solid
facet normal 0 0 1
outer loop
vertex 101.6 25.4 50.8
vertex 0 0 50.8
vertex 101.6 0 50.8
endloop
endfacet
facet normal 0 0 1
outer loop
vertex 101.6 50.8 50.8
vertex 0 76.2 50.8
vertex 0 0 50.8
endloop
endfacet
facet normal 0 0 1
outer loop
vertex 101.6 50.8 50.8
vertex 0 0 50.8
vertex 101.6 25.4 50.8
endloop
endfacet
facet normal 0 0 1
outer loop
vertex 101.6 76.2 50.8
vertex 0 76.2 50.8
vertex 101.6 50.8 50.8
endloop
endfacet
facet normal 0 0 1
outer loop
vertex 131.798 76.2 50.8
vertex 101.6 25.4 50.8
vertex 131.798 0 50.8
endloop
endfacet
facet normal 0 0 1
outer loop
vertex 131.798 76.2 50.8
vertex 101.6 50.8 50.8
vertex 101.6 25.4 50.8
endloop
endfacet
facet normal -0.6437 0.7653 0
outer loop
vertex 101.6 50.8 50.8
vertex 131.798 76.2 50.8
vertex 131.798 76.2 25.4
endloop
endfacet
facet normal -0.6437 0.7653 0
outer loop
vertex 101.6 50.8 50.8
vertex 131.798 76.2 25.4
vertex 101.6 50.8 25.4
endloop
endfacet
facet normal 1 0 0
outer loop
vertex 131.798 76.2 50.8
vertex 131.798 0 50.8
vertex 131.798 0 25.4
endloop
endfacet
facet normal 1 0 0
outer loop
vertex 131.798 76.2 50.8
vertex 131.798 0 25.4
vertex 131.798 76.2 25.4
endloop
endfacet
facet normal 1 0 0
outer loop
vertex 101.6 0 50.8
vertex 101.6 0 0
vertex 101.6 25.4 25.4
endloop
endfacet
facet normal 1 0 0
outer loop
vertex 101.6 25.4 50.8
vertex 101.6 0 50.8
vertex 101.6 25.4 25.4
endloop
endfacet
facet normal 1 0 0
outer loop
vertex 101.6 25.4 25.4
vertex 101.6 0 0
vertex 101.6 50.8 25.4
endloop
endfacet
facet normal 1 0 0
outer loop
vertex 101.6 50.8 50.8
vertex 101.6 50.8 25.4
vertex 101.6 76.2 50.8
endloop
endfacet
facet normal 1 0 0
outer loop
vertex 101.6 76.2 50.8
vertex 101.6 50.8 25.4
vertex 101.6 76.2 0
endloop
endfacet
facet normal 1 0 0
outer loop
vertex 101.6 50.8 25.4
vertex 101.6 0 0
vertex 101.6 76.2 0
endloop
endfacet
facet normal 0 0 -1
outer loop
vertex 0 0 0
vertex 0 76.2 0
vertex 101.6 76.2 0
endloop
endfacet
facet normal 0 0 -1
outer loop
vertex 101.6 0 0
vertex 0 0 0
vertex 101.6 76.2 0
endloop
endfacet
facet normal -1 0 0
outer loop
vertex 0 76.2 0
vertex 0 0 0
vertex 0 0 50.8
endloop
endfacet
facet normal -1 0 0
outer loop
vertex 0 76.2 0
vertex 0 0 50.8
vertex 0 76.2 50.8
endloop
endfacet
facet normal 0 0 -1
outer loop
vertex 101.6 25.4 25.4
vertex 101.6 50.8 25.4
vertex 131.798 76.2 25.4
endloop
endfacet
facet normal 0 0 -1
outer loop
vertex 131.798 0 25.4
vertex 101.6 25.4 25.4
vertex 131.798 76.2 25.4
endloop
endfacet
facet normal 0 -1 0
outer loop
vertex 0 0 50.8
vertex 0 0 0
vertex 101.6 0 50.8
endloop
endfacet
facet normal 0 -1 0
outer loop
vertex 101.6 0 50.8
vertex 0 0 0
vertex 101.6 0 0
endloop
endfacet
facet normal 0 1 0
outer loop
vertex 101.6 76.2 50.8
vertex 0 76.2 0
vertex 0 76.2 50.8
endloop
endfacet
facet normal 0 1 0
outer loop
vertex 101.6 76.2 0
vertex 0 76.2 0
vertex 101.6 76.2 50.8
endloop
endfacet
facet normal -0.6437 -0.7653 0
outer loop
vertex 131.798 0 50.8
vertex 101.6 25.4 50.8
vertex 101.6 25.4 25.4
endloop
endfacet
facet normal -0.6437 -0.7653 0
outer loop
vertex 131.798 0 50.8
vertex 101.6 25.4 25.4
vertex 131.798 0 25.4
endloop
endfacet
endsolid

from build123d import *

# Parameters (mm, degrees)
F0_W     = 101.6
F0_H     = 76.2
F1_DEPTH = 50.8
F3_DEPTH = 25.4


with BuildPart() as f1:
    # F0 (on Top) → F1 (new body)
    with BuildSketch(Plane.XY):
        with Locations((50.8, 38.1)):
            Rectangle(F0_W, F0_H)
    extrude(amount=F1_DEPTH)

    # F2 (on face) → F3 (join)
    with BuildSketch(Plane.XY.offset(50.8)):
        Polygon((101.6, 50.8), (101.6, 25.4), (131.798387, 0), (131.798387, 76.2), align=None)
    extrude(amount=-F3_DEPTH)


solid = f1.part
